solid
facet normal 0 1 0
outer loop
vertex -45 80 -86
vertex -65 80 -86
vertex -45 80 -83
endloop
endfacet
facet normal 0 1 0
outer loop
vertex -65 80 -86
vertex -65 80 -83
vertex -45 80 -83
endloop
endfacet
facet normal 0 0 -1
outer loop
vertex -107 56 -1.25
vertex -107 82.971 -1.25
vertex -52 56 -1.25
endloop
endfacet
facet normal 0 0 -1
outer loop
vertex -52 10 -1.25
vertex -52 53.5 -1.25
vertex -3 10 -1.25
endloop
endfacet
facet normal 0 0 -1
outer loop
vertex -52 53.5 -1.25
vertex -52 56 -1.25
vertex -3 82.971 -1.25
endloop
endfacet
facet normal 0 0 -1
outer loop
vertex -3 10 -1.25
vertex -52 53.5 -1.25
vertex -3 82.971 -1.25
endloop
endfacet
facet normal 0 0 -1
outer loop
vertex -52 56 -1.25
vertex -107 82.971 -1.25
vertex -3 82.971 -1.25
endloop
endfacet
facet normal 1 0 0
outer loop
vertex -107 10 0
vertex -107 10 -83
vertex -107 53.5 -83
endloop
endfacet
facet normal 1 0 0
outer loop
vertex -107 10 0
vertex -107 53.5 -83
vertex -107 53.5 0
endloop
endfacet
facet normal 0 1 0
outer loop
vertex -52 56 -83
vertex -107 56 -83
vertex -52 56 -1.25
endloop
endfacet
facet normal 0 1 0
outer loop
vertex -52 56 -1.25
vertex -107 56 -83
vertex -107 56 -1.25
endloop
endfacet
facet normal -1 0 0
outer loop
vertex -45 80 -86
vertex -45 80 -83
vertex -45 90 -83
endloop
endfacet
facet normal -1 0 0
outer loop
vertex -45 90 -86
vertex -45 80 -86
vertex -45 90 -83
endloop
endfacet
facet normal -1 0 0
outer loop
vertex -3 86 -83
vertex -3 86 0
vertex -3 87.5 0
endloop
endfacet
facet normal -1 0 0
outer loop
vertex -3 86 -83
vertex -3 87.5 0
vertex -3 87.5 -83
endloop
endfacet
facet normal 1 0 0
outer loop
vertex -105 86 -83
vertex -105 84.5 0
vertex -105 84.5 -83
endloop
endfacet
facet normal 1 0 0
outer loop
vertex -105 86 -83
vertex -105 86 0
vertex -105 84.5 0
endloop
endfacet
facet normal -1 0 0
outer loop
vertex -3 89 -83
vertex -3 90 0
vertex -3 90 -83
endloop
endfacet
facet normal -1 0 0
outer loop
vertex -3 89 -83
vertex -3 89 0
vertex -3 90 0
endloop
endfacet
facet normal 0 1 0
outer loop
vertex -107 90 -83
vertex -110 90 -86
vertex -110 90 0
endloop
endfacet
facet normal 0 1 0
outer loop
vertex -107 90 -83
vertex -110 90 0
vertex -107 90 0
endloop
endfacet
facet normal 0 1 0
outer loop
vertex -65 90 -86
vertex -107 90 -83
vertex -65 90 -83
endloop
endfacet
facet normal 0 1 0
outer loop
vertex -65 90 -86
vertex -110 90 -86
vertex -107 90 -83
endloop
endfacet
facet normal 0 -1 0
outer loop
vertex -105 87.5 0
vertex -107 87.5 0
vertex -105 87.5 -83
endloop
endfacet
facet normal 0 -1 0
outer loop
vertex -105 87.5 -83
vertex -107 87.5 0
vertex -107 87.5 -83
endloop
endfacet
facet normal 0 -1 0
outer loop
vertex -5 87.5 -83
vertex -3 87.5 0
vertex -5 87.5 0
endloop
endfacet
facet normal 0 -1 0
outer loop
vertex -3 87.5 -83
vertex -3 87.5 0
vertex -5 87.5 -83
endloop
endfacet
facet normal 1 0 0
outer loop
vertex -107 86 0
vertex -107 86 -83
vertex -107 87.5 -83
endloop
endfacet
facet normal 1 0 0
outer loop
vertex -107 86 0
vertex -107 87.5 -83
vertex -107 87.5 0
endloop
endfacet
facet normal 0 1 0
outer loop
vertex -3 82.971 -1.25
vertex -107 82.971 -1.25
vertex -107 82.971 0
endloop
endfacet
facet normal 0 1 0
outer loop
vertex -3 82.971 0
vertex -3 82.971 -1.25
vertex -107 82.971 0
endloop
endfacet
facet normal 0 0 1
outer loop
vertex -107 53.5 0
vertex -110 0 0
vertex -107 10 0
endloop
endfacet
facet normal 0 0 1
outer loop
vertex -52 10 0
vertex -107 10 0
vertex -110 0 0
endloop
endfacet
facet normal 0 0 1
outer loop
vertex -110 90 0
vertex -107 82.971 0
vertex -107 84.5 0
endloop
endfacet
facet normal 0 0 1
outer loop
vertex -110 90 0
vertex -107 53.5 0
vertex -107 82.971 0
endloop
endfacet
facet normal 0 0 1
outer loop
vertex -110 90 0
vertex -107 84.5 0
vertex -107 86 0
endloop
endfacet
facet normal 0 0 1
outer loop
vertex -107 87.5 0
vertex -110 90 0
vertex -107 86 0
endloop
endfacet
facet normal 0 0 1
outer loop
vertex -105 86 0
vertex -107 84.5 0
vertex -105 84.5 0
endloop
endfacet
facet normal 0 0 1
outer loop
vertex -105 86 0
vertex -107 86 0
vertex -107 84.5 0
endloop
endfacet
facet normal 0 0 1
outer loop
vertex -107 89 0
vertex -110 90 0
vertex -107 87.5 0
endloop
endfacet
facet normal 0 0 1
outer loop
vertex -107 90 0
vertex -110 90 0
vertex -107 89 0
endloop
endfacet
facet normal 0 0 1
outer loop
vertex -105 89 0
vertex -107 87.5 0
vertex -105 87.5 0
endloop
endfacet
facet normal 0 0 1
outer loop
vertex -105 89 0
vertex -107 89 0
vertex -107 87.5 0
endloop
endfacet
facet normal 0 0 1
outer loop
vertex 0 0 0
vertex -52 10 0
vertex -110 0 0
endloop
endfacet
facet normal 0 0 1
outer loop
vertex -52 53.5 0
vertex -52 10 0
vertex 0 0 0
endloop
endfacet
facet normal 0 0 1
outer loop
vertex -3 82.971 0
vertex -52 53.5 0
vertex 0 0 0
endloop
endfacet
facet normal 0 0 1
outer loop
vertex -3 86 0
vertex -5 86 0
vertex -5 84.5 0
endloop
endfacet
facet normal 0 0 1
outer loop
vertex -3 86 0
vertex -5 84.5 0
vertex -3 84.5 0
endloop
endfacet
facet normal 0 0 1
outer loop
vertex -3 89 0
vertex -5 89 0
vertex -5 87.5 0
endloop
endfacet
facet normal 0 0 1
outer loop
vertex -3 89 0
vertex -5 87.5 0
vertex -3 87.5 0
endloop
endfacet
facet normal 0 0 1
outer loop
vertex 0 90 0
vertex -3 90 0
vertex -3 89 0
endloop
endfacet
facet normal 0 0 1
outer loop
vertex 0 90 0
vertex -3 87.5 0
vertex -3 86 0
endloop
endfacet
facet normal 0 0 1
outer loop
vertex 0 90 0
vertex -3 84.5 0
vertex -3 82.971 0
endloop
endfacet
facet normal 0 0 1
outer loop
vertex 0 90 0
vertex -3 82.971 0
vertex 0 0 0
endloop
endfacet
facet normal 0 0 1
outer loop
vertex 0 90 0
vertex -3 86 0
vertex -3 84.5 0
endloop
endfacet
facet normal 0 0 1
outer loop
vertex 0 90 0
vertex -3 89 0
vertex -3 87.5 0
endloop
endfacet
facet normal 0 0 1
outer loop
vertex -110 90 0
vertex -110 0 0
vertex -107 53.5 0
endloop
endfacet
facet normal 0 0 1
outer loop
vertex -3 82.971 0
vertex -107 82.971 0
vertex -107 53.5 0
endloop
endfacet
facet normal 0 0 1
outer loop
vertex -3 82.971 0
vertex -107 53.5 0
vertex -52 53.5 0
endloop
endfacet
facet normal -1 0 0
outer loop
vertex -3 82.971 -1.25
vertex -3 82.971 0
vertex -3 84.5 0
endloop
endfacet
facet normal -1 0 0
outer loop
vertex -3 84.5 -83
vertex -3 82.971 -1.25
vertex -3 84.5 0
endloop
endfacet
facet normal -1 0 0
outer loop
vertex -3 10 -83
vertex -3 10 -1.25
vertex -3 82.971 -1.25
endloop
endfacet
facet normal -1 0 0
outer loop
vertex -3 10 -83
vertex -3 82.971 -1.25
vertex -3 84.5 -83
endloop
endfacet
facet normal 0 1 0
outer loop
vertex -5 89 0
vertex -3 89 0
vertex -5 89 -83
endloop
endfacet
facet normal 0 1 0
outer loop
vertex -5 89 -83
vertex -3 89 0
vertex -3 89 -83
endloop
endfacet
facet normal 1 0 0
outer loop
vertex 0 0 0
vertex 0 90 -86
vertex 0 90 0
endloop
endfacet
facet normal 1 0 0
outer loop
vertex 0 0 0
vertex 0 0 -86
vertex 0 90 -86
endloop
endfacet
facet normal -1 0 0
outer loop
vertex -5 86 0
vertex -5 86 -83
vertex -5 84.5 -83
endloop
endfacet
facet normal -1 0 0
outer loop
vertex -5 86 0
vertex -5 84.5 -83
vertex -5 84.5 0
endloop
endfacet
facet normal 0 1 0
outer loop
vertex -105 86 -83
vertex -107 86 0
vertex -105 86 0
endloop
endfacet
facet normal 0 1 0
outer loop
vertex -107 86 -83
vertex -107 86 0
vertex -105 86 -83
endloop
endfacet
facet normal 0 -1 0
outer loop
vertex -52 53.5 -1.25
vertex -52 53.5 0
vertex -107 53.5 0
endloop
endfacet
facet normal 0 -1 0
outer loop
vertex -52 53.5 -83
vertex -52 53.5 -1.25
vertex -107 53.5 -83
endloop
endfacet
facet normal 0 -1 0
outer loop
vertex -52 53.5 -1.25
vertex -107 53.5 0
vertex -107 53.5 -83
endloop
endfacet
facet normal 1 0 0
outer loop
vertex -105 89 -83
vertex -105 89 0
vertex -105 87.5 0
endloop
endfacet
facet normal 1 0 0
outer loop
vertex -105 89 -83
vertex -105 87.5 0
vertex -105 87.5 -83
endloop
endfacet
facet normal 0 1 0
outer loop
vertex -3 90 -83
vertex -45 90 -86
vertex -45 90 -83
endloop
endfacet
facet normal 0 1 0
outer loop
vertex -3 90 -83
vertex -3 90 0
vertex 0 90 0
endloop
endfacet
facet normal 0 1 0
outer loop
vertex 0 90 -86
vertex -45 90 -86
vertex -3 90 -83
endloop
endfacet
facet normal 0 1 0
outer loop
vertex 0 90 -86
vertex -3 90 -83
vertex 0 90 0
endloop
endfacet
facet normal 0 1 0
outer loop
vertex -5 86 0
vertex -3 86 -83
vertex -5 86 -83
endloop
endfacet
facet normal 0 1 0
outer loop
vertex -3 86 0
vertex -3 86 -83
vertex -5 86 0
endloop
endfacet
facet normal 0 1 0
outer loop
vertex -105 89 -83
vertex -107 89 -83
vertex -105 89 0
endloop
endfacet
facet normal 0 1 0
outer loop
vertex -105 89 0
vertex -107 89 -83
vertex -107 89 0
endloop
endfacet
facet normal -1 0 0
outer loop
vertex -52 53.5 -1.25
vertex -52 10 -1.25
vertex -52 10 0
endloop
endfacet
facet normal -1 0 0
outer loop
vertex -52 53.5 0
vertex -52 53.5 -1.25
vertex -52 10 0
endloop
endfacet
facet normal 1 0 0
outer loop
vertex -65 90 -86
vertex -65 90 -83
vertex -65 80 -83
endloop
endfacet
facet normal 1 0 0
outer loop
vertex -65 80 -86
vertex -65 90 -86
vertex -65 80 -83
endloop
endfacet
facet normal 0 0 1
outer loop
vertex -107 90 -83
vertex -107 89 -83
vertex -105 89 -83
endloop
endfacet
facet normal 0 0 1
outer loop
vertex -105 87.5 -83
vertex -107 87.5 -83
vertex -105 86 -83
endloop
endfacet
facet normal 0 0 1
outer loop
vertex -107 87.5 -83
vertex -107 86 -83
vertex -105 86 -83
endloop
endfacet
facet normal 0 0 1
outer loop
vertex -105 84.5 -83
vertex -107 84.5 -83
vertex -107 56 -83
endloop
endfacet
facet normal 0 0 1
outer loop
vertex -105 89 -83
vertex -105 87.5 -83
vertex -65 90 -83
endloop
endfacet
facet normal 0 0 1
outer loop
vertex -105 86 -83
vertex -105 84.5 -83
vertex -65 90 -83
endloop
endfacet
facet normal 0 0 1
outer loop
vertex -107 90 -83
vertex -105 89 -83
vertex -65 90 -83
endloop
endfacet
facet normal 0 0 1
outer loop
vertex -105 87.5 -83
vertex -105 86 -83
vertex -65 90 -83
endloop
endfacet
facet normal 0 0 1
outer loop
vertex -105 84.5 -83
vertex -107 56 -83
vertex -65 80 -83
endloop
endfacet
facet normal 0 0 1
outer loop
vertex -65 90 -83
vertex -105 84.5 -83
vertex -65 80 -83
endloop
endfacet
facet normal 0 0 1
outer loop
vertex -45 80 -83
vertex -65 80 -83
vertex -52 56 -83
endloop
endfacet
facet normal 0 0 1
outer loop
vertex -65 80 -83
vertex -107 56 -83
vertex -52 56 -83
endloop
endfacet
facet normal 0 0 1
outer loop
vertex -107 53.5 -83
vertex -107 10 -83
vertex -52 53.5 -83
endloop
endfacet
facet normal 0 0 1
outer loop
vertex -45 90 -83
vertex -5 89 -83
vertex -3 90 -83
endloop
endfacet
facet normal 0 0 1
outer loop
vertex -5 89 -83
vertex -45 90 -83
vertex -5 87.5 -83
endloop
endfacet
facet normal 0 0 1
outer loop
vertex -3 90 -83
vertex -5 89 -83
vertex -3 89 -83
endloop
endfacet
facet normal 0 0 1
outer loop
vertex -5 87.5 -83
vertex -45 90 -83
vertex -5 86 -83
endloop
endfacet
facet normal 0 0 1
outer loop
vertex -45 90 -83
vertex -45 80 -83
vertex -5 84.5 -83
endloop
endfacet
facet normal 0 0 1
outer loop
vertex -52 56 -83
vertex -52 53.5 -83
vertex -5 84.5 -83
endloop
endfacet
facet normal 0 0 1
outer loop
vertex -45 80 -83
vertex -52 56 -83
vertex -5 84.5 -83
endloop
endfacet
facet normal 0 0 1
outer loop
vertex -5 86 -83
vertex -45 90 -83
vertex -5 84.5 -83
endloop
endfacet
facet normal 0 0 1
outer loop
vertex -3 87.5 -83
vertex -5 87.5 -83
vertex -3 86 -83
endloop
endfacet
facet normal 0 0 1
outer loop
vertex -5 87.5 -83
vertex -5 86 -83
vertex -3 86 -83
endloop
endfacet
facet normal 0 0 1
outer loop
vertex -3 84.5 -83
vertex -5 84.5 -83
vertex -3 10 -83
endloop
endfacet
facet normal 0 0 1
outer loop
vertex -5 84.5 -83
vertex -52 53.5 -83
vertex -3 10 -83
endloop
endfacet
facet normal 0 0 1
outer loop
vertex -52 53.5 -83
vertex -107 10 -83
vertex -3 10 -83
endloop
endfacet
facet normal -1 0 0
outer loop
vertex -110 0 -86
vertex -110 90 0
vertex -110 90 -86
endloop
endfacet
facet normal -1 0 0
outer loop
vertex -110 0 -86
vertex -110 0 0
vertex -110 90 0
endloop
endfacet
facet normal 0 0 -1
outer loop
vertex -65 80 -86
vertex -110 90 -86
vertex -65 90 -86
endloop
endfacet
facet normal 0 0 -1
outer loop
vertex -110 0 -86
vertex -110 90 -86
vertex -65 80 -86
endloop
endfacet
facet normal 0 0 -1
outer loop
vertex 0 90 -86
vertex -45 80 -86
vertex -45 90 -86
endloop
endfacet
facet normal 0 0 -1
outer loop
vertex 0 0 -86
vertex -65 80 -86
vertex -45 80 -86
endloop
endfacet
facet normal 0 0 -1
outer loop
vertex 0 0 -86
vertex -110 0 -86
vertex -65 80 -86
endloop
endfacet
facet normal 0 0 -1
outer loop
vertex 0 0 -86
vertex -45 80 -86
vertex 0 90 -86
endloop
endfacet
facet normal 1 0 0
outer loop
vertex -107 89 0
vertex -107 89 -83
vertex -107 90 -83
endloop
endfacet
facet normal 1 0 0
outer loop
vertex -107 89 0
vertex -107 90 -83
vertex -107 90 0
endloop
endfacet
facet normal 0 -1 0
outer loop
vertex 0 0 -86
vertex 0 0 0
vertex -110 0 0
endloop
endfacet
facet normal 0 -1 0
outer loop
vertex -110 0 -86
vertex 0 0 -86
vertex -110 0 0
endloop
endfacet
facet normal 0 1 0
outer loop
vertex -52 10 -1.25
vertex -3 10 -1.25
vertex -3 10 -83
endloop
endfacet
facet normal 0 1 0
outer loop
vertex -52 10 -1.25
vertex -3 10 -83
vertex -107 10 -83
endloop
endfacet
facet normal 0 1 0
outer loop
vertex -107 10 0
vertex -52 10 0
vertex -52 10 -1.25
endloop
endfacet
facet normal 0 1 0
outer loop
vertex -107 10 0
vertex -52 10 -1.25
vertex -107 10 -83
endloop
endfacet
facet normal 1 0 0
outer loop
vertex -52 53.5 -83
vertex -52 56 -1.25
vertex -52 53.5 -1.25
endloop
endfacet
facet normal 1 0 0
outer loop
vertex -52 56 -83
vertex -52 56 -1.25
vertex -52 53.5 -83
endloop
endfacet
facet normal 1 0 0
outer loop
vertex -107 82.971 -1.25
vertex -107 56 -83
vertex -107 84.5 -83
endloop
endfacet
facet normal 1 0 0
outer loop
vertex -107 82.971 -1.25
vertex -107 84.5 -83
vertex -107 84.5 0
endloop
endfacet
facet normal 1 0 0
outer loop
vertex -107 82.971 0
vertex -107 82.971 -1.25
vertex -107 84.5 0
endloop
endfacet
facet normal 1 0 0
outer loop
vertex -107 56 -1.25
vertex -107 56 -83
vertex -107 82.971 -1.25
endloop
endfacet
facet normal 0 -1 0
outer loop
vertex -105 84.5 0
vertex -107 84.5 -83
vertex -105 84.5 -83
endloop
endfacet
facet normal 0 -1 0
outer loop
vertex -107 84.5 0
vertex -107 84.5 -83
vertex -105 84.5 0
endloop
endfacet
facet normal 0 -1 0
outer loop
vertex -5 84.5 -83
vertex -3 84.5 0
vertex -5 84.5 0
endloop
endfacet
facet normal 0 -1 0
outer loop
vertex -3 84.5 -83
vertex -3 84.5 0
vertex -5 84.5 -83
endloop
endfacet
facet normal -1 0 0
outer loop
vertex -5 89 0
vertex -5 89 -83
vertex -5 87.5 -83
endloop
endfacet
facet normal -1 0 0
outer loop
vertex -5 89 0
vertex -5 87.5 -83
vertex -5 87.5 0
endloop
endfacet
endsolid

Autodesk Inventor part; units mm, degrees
ref_plane "YZ Plane" through (0, 0, 0) normal (1, 0, 0) x (0, 1, 0)
ref_plane "XZ Plane" through (0, 0, 0) normal (0, 1, 0) x (-1, 0, 0)
ref_plane "XY Plane" through (0, 0, 0) normal (0, 0, 1) x (1, 0, 0)
sketch "Sketch12" plane through (0, 0, 0) normal (0, 1, 0) x (-1, 0, 0)
  line L0 (0, 0) -> (110, 0)
  line L1 (110, 0) -> (110, -86)
  line L2 (110, -86) -> (0, -86)
  line L3 (0, -86) -> (0, 0)
  dimension "d23" = 110
  dimension "d24" = 86
extrude "Extrusion6" add sketch "Sketch12" along normal blind 10
sketch "Sketch13" plane through (0, 10, 0) normal (0, 1, 0) x (1, 0, 0)
  line L0 (0, 0) -> (0, 86) projected
  line L1 (-110, 0) -> (0, 0) projected
  line L2 (0, 86) -> (-110, 86) projected
  line L3 (-110, 86) -> (-110, 0) projected
  line L4 (-107, 43) -> (-107, 83)
  line L5 (-107, 83) -> (-107, 0)
  line L6 (-107, 83) -> (-3, 83)
  line L7 (-3, 0) -> (-3, 83)
extrude "Extrusion7" add sketch "Sketch13" along normal blind 80 contours L1 L7 L6 L4 L5 L3 L2 L0
sketch "Sketch14" plane through (-107, 10, -83) normal (0, 0, 1) x (1, 0, 0)
  line L0 (0, 80) -> (104, 80) projected
  line L1 (62, 80) -> (42, 80)
  line L2 (42, 80) -> (42, 70)
  line L3 (42, 70) -> (62, 70)
  line L4 (62, 70) -> (62, 80)
  point P0 (107, -10)
  dimension "d33" = 20
  dimension "d34" = 10
  dimension "d35" = 20
extrude "Extrusion8" cut sketch "Sketch14" against normal through all
sketch "Sketch15" plane through (-107, 10, 0) normal (1, 0, 0) x (0, 0, -1)
  line L0 (0, 80) -> (83, 80) projected
  line L1 (41.5, 79) -> (83, 79)
  line L2 (83, 0) -> (83, 80) projected
  line L3 (83, 79) -> (0, 79)
  line L4 (0, 0) -> (0, 80) projected
  line L5 (0, 79) -> (0, 77.5)
  line L6 (0, 77.5) -> (83, 77.5)
  line L7 (0, 76) -> (83, 76)
  line L8 (83, 76) -> (83, 74.5)
  line L9 (83, 74.5) -> (0, 74.5)
  line L10 (0, 76) -> (0, 74.5)
  line L11 (83, 79) -> (83, 77.5)
  point P0 (0, -10)
  dimension "d39" = 1.5
  dimension "d40" = 1.5
  dimension "d41" = 1.5
extrude "Extrusion9" add sketch "Sketch15" along normal blind 2 contours L3 L1 L2 L6 L4 | L7 L2 L9 L4
sketch "Sketch16" plane through (-3, 10, -83) normal (-1, 0, 0) x (0, 0, 1)
  line L0 (0, 80) -> (83, 80) projected
  line L1 (41.5, 79) -> (0, 79)
  line L2 (0, 0) -> (0, 80) projected
  line L3 (0, 79) -> (83, 79)
  line L4 (83, 0) -> (83, 80) projected
  line L5 (83, 79) -> (83, 77.5)
  line L6 (83, -10) -> (83, 80) projected
  line L7 (83, 77.5) -> (0, 77.5)
  line L8 (0, 77.5) -> (0, 79)
  line L9 (0, 76) -> (83, 76)
  line L10 (83, 76) -> (83, 74.5)
  line L11 (83, 74.5) -> (0, 74.5)
  line L12 (0, 74.5) -> (0, 76)
  point P0 (0, 74.5)
  point P1 (0, 76)
  dimension "d45" = 1.5
  dimension "d46" = 1.5
  dimension "d47" = 1.5
extrude "Extrusion10" add sketch "Sketch16" along normal blind 2 contours L1 L3 L4 L7 L2 | L9 L4 L11 L2
sketch "Sketch17" plane through (-107, 10, 0) normal (1, 0, 0) x (0, 0, -1)
  line L0 (83, 74.5) -> (0, 74.5) projected
  line L1 (0, 0) -> (0, 74.5) projected
  line L2 (0, 43.5) -> (83, 43.5)
  line L3 (83, 0) -> (83, 74.5) projected
  line L4 (83, 43.5) -> (83, 46)
  line L5 (83, 46) -> (0, 45.9998)
  line L6 (0, 45.9998) -> (0, 43.5)
  point P0 (0, -10)
  dimension "d50" = 31
  dimension "d51" = 2.5
extrude "Extrusion11" add sketch "Sketch17" along normal blind 55 contours L3 L2 L1 L5
sketch "Sketch18" plane through (-107, 84.5, 0) normal (1, 0, 0) x (0, 0, -1)
  line L0 (0, -84.5) -> (0, 5.5) projected
  line L1 (0, -28.5002) -> (0, 0) projected
  line L2 (0, -1.5292) -> (0, -28.5002)
  line L3 (0, -28.5002) -> (1.25, -28.5002)
  line L4 (0, -28.5002) -> (83, -28.5) projected
  line L5 (1.25, -28.5002) -> (1.25, -1.5292)
  line L6 (1.25, -1.5292) -> (0, -1.5292)
  dimension "d54" = 1.25
  dimension "d55" = 26.971
extrude "Extrusion12" add sketch "Sketch18" along normal up to surface (104 mm away)
sketch "Sketch19" plane through (-52, 55.9998, -1.25) normal (0, -1, 0) x (1, 0, 0)
  line L0 (0, 0) -> (0, 1.25) projected
  line L1 (0, 1.25) -> (49, 1.25) projected
  line L2 (0, 1.25) -> (49, 1.25)
  line L3 (49, 1.25) -> (49, 0) projected
  line L4 (49, 1.25) -> (49, 0)
  line L5 (0, 0) -> (49, 0) projected
  line L6 (0, 1.25) -> (0, 0)
  line L7 (0, -81.75) -> (0, 0) projected
  line L8 (0, 0) -> (49, 0)
  point P0 (52, 1.2502)
extrude "Extrusion13" add sketch "Sketch19" along normal up to surface (45.9998 mm away)
sketch "Sketch20" plane through (-110, 0, 0) normal (0, 0, 1) x (1, 0, 0)
  point P0 (110, 0)
properties part number "circuit casing"
